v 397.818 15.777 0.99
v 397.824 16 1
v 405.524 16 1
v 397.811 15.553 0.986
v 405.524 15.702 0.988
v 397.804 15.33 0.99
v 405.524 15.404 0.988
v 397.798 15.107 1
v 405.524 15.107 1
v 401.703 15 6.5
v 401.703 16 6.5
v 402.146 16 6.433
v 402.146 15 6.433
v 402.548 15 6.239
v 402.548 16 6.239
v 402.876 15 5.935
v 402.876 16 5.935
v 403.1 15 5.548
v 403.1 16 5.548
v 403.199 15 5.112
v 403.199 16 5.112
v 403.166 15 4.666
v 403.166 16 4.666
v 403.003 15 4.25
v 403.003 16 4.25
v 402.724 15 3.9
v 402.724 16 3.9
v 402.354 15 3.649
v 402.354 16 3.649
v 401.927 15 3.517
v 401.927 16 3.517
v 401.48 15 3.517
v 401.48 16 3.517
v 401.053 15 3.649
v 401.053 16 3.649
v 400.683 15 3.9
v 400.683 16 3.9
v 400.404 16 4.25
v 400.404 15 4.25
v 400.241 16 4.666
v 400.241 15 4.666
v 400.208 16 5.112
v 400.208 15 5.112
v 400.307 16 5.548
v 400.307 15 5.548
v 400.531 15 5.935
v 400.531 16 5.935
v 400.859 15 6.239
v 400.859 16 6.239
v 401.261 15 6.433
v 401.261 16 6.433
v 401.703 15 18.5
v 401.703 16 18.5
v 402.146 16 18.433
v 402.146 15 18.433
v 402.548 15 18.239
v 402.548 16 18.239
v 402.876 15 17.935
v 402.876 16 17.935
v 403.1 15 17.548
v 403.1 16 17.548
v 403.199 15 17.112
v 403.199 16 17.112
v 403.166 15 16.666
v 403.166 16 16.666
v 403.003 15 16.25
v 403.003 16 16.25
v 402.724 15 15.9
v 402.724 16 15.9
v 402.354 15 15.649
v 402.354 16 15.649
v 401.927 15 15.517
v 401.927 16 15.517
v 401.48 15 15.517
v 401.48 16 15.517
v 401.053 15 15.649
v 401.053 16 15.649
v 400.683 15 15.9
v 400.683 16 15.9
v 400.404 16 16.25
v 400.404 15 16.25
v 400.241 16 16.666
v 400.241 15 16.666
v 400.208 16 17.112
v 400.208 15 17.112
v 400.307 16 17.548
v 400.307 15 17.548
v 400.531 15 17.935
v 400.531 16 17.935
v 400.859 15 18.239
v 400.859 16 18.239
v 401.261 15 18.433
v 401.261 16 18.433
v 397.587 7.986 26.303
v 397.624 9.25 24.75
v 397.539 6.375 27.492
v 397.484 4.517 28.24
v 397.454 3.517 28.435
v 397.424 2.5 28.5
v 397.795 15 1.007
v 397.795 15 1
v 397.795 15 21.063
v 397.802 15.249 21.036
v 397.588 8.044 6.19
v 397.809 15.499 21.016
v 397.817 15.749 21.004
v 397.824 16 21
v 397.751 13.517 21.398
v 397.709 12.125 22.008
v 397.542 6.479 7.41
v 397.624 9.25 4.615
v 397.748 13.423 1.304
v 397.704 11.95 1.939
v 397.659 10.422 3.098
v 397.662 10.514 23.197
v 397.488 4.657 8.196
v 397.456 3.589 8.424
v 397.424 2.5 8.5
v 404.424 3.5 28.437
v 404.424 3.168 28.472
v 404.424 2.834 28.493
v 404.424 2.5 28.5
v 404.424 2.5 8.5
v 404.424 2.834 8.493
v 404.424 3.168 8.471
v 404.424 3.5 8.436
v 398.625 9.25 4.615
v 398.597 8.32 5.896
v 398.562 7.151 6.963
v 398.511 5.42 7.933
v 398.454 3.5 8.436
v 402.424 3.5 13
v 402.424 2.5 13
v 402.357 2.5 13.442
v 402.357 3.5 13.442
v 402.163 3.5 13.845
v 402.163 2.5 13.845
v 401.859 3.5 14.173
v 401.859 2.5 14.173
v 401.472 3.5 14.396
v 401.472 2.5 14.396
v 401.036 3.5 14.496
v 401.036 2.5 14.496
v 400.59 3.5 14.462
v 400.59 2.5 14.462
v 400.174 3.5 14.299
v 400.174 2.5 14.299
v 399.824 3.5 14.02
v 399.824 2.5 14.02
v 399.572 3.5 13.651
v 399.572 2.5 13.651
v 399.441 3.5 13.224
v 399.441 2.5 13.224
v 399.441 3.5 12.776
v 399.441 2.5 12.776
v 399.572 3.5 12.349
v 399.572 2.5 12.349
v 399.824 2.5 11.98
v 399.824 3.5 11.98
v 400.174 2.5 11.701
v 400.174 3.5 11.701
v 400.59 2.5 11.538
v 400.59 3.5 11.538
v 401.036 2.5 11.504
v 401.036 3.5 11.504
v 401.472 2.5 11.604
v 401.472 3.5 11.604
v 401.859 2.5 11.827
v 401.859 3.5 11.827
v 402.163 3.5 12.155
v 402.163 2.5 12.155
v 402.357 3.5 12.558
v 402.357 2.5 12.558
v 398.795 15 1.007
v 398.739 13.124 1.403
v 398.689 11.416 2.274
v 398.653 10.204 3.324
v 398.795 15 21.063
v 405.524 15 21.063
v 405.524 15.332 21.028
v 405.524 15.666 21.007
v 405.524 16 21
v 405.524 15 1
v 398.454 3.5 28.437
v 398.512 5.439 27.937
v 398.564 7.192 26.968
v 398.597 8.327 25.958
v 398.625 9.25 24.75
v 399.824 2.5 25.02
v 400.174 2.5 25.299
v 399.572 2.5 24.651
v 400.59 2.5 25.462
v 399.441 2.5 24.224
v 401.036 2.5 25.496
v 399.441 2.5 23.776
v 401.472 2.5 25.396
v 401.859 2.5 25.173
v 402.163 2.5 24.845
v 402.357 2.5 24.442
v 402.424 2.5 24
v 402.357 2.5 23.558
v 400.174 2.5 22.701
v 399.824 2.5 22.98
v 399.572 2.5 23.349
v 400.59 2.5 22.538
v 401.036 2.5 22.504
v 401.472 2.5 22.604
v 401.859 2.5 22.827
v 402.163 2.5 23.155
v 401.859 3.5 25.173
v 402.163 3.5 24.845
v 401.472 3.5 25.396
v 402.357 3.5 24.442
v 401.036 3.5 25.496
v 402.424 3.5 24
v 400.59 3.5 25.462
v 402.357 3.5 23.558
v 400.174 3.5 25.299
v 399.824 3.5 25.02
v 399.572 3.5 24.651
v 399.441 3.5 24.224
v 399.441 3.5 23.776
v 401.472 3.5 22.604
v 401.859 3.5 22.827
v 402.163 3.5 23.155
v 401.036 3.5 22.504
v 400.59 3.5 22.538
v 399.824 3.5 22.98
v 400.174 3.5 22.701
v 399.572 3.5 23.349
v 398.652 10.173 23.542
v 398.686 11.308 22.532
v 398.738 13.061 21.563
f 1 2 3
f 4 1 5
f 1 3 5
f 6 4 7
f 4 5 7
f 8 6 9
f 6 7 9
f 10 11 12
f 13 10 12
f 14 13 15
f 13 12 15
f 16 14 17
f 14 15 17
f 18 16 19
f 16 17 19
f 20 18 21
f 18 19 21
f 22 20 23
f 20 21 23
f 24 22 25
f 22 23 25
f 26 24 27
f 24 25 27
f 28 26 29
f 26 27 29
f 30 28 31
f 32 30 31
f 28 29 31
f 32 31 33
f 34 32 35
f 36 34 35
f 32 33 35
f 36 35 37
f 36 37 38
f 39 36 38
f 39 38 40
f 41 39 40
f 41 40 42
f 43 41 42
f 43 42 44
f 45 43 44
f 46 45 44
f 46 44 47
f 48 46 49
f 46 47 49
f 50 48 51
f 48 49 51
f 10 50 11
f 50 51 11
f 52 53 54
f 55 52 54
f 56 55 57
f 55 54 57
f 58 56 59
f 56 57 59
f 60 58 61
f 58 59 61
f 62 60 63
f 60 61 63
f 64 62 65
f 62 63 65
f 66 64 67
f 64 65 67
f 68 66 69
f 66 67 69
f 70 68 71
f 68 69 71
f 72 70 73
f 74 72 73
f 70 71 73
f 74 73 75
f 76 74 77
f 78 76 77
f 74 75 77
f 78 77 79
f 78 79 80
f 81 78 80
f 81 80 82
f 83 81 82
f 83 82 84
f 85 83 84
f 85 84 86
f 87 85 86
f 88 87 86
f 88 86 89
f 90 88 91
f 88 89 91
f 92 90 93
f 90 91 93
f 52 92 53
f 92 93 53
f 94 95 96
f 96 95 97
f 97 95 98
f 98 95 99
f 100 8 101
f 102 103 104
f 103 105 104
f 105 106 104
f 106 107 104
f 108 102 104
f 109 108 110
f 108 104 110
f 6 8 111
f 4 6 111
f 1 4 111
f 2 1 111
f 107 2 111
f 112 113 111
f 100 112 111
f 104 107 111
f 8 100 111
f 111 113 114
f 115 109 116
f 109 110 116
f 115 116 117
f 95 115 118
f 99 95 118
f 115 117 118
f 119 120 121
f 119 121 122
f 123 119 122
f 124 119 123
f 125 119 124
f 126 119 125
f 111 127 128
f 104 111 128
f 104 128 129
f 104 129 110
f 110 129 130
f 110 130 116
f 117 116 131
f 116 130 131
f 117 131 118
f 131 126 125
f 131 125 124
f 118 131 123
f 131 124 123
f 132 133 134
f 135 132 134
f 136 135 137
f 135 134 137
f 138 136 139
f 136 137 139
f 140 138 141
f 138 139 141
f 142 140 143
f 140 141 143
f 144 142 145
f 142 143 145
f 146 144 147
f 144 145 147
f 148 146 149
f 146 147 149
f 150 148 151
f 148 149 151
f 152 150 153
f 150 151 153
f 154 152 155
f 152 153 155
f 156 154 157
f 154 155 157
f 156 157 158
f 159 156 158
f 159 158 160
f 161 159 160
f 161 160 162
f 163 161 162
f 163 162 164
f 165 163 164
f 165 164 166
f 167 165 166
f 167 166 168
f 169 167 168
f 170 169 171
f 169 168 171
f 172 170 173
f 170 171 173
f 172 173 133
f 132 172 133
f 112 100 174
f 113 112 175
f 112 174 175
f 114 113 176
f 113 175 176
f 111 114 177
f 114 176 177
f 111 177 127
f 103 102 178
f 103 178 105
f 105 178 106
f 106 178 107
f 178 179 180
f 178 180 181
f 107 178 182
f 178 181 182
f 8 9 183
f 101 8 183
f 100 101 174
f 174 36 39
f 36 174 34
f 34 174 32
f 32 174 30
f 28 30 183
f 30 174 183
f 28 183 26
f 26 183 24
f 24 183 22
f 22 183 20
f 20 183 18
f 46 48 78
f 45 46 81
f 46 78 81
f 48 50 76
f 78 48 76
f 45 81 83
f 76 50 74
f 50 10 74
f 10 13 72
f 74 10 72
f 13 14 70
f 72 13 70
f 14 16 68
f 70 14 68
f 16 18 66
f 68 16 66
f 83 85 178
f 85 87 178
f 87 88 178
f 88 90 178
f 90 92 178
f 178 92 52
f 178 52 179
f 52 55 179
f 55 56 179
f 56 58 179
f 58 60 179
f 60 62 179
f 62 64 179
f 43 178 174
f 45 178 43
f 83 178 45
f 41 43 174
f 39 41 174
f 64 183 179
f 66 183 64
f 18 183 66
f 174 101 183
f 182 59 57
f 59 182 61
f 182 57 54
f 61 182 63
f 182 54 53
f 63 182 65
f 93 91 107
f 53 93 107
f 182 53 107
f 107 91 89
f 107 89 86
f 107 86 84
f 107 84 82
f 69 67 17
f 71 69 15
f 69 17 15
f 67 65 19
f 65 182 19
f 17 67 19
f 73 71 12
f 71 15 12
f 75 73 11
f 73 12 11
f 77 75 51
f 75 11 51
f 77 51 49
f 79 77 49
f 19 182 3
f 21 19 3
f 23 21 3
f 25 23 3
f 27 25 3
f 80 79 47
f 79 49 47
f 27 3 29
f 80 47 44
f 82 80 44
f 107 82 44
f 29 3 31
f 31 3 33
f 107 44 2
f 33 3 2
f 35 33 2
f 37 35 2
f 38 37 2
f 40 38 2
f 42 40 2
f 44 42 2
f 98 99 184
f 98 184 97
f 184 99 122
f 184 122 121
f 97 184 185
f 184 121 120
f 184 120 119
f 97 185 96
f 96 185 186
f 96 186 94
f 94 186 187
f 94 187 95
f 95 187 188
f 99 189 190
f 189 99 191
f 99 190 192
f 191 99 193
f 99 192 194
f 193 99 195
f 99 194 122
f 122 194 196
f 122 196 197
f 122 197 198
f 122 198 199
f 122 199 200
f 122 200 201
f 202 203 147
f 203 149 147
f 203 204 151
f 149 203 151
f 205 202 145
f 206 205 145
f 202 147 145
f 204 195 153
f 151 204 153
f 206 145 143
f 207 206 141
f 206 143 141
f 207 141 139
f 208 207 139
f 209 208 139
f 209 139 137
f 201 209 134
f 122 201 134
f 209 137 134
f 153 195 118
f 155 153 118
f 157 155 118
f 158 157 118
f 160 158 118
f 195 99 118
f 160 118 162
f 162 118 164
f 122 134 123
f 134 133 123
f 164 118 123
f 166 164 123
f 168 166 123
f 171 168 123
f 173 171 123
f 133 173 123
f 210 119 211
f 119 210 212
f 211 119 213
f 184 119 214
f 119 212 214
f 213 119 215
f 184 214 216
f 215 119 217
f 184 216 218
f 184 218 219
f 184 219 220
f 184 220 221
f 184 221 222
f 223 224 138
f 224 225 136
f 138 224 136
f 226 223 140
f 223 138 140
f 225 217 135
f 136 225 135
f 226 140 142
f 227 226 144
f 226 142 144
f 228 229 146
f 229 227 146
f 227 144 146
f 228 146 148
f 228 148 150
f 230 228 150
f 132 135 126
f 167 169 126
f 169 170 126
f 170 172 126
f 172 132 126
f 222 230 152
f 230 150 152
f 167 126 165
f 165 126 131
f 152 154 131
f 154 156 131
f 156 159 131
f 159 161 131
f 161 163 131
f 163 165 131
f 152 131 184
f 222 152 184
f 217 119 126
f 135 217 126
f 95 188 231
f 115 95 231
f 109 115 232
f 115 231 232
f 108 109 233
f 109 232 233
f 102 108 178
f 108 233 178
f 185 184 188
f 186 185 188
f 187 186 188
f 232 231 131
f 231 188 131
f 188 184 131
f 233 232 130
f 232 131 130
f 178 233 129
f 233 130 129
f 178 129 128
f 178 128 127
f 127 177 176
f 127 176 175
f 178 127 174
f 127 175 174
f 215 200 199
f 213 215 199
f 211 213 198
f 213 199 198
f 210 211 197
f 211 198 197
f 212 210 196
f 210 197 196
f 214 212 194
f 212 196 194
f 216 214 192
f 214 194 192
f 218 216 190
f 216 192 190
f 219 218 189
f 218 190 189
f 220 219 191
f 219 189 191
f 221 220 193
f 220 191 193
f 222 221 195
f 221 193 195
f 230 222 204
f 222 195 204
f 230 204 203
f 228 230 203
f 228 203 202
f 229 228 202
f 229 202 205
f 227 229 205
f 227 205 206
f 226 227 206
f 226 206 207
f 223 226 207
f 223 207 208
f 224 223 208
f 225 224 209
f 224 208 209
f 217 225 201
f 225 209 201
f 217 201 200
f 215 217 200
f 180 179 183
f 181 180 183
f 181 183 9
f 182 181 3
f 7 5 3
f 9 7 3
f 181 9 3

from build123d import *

# Parameters (mm, degrees)
BOSS_EXTRUDE1_DEPTH = 28.5
SKETCH5_R           = 1.5
CUT_EXTRUDE4_DEPTH  = 1
SKETCH11_W          = 1
SKETCH11_H          = 12.5
CUT_EXTRUDE5_DEPTH  = 10
SKETCH12_W          = 20.843481987
SKETCH12_H          = 1.334220042
CUT_EXTRUDE7_DEPTH  = 1
SKETCH13_R          = 1.5
CUT_EXTRUDE8_DEPTH  = 1


with BuildPart() as part:
    # Sketch1 → Boss-Extrude1 (new body)
    with BuildSketch(Plane.XY):
        Polygon((397.82422908, 16), (397.423944987, 2.5), (405.423944987, 2.5), (405.423944987, 3.5), (398.454035145, 3.5), (398.795017891, 15), (405.52422908, 15), (405.52422908, 16), align=None)
    extrude(amount=BOSS_EXTRUDE1_DEPTH)

    # Sketch5 → Cut-Extrude4 (cut)
    with BuildSketch(Plane(origin=(0, 16, 0), x_dir=(1, 0, 0), z_dir=(0, 1, 0))):
        with Locations(Location((401.703493459, -5, 0), (0, 0, 270))):
            Circle(SKETCH5_R)
        with Locations(Location((401.703493459, -17, 0), (0, 0, 270))):
            Circle(SKETCH5_R)
    extrude(amount=-CUT_EXTRUDE4_DEPTH, mode=Mode.SUBTRACT)

    # Sketch11 → Cut-Extrude5 (cut)
    with BuildSketch(Plane(origin=(405.52422908, 0, 0), x_dir=(0, 0, -1), z_dir=(1, 0, 0))):
        with BuildLine():
            ThreePointArc((-24.75, 9.25), (-22.257567862, 11.708863545), (-21.063143846, 15))
            Line((-21.063143846, 15), (-28.5, 15))
            Line((-28.5, 15), (-28.5, 2.5))
            ThreePointArc((-28.5, 2.5), (-27.499550345, 6.360861303), (-24.75, 9.25))
        make_face()
        with BuildLine():
            ThreePointArc((-21.063143846, 15), (-21.015801665, 15.499004205), (-21, 16))
            Line((-21, 16), (-28.5, 16))
            Line((-28.5, 16), (-28.5, 15))
            Line((-28.5, 15), (-21.063143846, 15))
        make_face()
        with Locations((-0.5, 8.75)):
            Rectangle(SKETCH11_W, SKETCH11_H)
        with BuildLine():
            Line((0, 15), (0, 16))
            Line((0, 16), (-1, 16))
            ThreePointArc((-1, 16), (-0.986298018, 15.553268089), (-1, 15.106536177))
            Line((-1, 15.106536177), (-1, 15))
            Line((-1, 15), (0, 15))
        make_face()
        with BuildLine():
            Line((-1, 2.5), (-1, 15))
            Line((-1, 15), (-1.007325107, 15))
            ThreePointArc((-1.007325107, 15), (-2.100816605, 11.679499144), (-4.614575443, 9.25))
            ThreePointArc((-4.614575443, 9.25), (-7.459265697, 6.394195167), (-8.5, 2.5))
            Line((-8.5, 2.5), (-2.5, 2.5))
            Line((-2.5, 2.5), (-1, 2.5))
        make_face()
    extrude(amount=-CUT_EXTRUDE5_DEPTH, mode=Mode.SUBTRACT)

    # Sketch12 → Cut-Extrude7 (cut)
    with BuildSketch(Plane(origin=(405.423944987, 0, 0), x_dir=(0, 0, -1), z_dir=(1, 0, 0))):
        with Locations((-18.404841791, 2.845743799)):
            Rectangle(SKETCH12_W, SKETCH12_H)
    extrude(amount=-CUT_EXTRUDE7_DEPTH, mode=Mode.SUBTRACT)

    # Sketch13 → Cut-Extrude8 (cut)
    with BuildSketch(Plane.XZ.offset(-2.5)):
        with Locations((400.923944987, 24)):
            Circle(SKETCH13_R)
        with Locations((400.923944987, 13)):
            Circle(SKETCH13_R)
    extrude(amount=-CUT_EXTRUDE8_DEPTH, mode=Mode.SUBTRACT)


solid = part.part
